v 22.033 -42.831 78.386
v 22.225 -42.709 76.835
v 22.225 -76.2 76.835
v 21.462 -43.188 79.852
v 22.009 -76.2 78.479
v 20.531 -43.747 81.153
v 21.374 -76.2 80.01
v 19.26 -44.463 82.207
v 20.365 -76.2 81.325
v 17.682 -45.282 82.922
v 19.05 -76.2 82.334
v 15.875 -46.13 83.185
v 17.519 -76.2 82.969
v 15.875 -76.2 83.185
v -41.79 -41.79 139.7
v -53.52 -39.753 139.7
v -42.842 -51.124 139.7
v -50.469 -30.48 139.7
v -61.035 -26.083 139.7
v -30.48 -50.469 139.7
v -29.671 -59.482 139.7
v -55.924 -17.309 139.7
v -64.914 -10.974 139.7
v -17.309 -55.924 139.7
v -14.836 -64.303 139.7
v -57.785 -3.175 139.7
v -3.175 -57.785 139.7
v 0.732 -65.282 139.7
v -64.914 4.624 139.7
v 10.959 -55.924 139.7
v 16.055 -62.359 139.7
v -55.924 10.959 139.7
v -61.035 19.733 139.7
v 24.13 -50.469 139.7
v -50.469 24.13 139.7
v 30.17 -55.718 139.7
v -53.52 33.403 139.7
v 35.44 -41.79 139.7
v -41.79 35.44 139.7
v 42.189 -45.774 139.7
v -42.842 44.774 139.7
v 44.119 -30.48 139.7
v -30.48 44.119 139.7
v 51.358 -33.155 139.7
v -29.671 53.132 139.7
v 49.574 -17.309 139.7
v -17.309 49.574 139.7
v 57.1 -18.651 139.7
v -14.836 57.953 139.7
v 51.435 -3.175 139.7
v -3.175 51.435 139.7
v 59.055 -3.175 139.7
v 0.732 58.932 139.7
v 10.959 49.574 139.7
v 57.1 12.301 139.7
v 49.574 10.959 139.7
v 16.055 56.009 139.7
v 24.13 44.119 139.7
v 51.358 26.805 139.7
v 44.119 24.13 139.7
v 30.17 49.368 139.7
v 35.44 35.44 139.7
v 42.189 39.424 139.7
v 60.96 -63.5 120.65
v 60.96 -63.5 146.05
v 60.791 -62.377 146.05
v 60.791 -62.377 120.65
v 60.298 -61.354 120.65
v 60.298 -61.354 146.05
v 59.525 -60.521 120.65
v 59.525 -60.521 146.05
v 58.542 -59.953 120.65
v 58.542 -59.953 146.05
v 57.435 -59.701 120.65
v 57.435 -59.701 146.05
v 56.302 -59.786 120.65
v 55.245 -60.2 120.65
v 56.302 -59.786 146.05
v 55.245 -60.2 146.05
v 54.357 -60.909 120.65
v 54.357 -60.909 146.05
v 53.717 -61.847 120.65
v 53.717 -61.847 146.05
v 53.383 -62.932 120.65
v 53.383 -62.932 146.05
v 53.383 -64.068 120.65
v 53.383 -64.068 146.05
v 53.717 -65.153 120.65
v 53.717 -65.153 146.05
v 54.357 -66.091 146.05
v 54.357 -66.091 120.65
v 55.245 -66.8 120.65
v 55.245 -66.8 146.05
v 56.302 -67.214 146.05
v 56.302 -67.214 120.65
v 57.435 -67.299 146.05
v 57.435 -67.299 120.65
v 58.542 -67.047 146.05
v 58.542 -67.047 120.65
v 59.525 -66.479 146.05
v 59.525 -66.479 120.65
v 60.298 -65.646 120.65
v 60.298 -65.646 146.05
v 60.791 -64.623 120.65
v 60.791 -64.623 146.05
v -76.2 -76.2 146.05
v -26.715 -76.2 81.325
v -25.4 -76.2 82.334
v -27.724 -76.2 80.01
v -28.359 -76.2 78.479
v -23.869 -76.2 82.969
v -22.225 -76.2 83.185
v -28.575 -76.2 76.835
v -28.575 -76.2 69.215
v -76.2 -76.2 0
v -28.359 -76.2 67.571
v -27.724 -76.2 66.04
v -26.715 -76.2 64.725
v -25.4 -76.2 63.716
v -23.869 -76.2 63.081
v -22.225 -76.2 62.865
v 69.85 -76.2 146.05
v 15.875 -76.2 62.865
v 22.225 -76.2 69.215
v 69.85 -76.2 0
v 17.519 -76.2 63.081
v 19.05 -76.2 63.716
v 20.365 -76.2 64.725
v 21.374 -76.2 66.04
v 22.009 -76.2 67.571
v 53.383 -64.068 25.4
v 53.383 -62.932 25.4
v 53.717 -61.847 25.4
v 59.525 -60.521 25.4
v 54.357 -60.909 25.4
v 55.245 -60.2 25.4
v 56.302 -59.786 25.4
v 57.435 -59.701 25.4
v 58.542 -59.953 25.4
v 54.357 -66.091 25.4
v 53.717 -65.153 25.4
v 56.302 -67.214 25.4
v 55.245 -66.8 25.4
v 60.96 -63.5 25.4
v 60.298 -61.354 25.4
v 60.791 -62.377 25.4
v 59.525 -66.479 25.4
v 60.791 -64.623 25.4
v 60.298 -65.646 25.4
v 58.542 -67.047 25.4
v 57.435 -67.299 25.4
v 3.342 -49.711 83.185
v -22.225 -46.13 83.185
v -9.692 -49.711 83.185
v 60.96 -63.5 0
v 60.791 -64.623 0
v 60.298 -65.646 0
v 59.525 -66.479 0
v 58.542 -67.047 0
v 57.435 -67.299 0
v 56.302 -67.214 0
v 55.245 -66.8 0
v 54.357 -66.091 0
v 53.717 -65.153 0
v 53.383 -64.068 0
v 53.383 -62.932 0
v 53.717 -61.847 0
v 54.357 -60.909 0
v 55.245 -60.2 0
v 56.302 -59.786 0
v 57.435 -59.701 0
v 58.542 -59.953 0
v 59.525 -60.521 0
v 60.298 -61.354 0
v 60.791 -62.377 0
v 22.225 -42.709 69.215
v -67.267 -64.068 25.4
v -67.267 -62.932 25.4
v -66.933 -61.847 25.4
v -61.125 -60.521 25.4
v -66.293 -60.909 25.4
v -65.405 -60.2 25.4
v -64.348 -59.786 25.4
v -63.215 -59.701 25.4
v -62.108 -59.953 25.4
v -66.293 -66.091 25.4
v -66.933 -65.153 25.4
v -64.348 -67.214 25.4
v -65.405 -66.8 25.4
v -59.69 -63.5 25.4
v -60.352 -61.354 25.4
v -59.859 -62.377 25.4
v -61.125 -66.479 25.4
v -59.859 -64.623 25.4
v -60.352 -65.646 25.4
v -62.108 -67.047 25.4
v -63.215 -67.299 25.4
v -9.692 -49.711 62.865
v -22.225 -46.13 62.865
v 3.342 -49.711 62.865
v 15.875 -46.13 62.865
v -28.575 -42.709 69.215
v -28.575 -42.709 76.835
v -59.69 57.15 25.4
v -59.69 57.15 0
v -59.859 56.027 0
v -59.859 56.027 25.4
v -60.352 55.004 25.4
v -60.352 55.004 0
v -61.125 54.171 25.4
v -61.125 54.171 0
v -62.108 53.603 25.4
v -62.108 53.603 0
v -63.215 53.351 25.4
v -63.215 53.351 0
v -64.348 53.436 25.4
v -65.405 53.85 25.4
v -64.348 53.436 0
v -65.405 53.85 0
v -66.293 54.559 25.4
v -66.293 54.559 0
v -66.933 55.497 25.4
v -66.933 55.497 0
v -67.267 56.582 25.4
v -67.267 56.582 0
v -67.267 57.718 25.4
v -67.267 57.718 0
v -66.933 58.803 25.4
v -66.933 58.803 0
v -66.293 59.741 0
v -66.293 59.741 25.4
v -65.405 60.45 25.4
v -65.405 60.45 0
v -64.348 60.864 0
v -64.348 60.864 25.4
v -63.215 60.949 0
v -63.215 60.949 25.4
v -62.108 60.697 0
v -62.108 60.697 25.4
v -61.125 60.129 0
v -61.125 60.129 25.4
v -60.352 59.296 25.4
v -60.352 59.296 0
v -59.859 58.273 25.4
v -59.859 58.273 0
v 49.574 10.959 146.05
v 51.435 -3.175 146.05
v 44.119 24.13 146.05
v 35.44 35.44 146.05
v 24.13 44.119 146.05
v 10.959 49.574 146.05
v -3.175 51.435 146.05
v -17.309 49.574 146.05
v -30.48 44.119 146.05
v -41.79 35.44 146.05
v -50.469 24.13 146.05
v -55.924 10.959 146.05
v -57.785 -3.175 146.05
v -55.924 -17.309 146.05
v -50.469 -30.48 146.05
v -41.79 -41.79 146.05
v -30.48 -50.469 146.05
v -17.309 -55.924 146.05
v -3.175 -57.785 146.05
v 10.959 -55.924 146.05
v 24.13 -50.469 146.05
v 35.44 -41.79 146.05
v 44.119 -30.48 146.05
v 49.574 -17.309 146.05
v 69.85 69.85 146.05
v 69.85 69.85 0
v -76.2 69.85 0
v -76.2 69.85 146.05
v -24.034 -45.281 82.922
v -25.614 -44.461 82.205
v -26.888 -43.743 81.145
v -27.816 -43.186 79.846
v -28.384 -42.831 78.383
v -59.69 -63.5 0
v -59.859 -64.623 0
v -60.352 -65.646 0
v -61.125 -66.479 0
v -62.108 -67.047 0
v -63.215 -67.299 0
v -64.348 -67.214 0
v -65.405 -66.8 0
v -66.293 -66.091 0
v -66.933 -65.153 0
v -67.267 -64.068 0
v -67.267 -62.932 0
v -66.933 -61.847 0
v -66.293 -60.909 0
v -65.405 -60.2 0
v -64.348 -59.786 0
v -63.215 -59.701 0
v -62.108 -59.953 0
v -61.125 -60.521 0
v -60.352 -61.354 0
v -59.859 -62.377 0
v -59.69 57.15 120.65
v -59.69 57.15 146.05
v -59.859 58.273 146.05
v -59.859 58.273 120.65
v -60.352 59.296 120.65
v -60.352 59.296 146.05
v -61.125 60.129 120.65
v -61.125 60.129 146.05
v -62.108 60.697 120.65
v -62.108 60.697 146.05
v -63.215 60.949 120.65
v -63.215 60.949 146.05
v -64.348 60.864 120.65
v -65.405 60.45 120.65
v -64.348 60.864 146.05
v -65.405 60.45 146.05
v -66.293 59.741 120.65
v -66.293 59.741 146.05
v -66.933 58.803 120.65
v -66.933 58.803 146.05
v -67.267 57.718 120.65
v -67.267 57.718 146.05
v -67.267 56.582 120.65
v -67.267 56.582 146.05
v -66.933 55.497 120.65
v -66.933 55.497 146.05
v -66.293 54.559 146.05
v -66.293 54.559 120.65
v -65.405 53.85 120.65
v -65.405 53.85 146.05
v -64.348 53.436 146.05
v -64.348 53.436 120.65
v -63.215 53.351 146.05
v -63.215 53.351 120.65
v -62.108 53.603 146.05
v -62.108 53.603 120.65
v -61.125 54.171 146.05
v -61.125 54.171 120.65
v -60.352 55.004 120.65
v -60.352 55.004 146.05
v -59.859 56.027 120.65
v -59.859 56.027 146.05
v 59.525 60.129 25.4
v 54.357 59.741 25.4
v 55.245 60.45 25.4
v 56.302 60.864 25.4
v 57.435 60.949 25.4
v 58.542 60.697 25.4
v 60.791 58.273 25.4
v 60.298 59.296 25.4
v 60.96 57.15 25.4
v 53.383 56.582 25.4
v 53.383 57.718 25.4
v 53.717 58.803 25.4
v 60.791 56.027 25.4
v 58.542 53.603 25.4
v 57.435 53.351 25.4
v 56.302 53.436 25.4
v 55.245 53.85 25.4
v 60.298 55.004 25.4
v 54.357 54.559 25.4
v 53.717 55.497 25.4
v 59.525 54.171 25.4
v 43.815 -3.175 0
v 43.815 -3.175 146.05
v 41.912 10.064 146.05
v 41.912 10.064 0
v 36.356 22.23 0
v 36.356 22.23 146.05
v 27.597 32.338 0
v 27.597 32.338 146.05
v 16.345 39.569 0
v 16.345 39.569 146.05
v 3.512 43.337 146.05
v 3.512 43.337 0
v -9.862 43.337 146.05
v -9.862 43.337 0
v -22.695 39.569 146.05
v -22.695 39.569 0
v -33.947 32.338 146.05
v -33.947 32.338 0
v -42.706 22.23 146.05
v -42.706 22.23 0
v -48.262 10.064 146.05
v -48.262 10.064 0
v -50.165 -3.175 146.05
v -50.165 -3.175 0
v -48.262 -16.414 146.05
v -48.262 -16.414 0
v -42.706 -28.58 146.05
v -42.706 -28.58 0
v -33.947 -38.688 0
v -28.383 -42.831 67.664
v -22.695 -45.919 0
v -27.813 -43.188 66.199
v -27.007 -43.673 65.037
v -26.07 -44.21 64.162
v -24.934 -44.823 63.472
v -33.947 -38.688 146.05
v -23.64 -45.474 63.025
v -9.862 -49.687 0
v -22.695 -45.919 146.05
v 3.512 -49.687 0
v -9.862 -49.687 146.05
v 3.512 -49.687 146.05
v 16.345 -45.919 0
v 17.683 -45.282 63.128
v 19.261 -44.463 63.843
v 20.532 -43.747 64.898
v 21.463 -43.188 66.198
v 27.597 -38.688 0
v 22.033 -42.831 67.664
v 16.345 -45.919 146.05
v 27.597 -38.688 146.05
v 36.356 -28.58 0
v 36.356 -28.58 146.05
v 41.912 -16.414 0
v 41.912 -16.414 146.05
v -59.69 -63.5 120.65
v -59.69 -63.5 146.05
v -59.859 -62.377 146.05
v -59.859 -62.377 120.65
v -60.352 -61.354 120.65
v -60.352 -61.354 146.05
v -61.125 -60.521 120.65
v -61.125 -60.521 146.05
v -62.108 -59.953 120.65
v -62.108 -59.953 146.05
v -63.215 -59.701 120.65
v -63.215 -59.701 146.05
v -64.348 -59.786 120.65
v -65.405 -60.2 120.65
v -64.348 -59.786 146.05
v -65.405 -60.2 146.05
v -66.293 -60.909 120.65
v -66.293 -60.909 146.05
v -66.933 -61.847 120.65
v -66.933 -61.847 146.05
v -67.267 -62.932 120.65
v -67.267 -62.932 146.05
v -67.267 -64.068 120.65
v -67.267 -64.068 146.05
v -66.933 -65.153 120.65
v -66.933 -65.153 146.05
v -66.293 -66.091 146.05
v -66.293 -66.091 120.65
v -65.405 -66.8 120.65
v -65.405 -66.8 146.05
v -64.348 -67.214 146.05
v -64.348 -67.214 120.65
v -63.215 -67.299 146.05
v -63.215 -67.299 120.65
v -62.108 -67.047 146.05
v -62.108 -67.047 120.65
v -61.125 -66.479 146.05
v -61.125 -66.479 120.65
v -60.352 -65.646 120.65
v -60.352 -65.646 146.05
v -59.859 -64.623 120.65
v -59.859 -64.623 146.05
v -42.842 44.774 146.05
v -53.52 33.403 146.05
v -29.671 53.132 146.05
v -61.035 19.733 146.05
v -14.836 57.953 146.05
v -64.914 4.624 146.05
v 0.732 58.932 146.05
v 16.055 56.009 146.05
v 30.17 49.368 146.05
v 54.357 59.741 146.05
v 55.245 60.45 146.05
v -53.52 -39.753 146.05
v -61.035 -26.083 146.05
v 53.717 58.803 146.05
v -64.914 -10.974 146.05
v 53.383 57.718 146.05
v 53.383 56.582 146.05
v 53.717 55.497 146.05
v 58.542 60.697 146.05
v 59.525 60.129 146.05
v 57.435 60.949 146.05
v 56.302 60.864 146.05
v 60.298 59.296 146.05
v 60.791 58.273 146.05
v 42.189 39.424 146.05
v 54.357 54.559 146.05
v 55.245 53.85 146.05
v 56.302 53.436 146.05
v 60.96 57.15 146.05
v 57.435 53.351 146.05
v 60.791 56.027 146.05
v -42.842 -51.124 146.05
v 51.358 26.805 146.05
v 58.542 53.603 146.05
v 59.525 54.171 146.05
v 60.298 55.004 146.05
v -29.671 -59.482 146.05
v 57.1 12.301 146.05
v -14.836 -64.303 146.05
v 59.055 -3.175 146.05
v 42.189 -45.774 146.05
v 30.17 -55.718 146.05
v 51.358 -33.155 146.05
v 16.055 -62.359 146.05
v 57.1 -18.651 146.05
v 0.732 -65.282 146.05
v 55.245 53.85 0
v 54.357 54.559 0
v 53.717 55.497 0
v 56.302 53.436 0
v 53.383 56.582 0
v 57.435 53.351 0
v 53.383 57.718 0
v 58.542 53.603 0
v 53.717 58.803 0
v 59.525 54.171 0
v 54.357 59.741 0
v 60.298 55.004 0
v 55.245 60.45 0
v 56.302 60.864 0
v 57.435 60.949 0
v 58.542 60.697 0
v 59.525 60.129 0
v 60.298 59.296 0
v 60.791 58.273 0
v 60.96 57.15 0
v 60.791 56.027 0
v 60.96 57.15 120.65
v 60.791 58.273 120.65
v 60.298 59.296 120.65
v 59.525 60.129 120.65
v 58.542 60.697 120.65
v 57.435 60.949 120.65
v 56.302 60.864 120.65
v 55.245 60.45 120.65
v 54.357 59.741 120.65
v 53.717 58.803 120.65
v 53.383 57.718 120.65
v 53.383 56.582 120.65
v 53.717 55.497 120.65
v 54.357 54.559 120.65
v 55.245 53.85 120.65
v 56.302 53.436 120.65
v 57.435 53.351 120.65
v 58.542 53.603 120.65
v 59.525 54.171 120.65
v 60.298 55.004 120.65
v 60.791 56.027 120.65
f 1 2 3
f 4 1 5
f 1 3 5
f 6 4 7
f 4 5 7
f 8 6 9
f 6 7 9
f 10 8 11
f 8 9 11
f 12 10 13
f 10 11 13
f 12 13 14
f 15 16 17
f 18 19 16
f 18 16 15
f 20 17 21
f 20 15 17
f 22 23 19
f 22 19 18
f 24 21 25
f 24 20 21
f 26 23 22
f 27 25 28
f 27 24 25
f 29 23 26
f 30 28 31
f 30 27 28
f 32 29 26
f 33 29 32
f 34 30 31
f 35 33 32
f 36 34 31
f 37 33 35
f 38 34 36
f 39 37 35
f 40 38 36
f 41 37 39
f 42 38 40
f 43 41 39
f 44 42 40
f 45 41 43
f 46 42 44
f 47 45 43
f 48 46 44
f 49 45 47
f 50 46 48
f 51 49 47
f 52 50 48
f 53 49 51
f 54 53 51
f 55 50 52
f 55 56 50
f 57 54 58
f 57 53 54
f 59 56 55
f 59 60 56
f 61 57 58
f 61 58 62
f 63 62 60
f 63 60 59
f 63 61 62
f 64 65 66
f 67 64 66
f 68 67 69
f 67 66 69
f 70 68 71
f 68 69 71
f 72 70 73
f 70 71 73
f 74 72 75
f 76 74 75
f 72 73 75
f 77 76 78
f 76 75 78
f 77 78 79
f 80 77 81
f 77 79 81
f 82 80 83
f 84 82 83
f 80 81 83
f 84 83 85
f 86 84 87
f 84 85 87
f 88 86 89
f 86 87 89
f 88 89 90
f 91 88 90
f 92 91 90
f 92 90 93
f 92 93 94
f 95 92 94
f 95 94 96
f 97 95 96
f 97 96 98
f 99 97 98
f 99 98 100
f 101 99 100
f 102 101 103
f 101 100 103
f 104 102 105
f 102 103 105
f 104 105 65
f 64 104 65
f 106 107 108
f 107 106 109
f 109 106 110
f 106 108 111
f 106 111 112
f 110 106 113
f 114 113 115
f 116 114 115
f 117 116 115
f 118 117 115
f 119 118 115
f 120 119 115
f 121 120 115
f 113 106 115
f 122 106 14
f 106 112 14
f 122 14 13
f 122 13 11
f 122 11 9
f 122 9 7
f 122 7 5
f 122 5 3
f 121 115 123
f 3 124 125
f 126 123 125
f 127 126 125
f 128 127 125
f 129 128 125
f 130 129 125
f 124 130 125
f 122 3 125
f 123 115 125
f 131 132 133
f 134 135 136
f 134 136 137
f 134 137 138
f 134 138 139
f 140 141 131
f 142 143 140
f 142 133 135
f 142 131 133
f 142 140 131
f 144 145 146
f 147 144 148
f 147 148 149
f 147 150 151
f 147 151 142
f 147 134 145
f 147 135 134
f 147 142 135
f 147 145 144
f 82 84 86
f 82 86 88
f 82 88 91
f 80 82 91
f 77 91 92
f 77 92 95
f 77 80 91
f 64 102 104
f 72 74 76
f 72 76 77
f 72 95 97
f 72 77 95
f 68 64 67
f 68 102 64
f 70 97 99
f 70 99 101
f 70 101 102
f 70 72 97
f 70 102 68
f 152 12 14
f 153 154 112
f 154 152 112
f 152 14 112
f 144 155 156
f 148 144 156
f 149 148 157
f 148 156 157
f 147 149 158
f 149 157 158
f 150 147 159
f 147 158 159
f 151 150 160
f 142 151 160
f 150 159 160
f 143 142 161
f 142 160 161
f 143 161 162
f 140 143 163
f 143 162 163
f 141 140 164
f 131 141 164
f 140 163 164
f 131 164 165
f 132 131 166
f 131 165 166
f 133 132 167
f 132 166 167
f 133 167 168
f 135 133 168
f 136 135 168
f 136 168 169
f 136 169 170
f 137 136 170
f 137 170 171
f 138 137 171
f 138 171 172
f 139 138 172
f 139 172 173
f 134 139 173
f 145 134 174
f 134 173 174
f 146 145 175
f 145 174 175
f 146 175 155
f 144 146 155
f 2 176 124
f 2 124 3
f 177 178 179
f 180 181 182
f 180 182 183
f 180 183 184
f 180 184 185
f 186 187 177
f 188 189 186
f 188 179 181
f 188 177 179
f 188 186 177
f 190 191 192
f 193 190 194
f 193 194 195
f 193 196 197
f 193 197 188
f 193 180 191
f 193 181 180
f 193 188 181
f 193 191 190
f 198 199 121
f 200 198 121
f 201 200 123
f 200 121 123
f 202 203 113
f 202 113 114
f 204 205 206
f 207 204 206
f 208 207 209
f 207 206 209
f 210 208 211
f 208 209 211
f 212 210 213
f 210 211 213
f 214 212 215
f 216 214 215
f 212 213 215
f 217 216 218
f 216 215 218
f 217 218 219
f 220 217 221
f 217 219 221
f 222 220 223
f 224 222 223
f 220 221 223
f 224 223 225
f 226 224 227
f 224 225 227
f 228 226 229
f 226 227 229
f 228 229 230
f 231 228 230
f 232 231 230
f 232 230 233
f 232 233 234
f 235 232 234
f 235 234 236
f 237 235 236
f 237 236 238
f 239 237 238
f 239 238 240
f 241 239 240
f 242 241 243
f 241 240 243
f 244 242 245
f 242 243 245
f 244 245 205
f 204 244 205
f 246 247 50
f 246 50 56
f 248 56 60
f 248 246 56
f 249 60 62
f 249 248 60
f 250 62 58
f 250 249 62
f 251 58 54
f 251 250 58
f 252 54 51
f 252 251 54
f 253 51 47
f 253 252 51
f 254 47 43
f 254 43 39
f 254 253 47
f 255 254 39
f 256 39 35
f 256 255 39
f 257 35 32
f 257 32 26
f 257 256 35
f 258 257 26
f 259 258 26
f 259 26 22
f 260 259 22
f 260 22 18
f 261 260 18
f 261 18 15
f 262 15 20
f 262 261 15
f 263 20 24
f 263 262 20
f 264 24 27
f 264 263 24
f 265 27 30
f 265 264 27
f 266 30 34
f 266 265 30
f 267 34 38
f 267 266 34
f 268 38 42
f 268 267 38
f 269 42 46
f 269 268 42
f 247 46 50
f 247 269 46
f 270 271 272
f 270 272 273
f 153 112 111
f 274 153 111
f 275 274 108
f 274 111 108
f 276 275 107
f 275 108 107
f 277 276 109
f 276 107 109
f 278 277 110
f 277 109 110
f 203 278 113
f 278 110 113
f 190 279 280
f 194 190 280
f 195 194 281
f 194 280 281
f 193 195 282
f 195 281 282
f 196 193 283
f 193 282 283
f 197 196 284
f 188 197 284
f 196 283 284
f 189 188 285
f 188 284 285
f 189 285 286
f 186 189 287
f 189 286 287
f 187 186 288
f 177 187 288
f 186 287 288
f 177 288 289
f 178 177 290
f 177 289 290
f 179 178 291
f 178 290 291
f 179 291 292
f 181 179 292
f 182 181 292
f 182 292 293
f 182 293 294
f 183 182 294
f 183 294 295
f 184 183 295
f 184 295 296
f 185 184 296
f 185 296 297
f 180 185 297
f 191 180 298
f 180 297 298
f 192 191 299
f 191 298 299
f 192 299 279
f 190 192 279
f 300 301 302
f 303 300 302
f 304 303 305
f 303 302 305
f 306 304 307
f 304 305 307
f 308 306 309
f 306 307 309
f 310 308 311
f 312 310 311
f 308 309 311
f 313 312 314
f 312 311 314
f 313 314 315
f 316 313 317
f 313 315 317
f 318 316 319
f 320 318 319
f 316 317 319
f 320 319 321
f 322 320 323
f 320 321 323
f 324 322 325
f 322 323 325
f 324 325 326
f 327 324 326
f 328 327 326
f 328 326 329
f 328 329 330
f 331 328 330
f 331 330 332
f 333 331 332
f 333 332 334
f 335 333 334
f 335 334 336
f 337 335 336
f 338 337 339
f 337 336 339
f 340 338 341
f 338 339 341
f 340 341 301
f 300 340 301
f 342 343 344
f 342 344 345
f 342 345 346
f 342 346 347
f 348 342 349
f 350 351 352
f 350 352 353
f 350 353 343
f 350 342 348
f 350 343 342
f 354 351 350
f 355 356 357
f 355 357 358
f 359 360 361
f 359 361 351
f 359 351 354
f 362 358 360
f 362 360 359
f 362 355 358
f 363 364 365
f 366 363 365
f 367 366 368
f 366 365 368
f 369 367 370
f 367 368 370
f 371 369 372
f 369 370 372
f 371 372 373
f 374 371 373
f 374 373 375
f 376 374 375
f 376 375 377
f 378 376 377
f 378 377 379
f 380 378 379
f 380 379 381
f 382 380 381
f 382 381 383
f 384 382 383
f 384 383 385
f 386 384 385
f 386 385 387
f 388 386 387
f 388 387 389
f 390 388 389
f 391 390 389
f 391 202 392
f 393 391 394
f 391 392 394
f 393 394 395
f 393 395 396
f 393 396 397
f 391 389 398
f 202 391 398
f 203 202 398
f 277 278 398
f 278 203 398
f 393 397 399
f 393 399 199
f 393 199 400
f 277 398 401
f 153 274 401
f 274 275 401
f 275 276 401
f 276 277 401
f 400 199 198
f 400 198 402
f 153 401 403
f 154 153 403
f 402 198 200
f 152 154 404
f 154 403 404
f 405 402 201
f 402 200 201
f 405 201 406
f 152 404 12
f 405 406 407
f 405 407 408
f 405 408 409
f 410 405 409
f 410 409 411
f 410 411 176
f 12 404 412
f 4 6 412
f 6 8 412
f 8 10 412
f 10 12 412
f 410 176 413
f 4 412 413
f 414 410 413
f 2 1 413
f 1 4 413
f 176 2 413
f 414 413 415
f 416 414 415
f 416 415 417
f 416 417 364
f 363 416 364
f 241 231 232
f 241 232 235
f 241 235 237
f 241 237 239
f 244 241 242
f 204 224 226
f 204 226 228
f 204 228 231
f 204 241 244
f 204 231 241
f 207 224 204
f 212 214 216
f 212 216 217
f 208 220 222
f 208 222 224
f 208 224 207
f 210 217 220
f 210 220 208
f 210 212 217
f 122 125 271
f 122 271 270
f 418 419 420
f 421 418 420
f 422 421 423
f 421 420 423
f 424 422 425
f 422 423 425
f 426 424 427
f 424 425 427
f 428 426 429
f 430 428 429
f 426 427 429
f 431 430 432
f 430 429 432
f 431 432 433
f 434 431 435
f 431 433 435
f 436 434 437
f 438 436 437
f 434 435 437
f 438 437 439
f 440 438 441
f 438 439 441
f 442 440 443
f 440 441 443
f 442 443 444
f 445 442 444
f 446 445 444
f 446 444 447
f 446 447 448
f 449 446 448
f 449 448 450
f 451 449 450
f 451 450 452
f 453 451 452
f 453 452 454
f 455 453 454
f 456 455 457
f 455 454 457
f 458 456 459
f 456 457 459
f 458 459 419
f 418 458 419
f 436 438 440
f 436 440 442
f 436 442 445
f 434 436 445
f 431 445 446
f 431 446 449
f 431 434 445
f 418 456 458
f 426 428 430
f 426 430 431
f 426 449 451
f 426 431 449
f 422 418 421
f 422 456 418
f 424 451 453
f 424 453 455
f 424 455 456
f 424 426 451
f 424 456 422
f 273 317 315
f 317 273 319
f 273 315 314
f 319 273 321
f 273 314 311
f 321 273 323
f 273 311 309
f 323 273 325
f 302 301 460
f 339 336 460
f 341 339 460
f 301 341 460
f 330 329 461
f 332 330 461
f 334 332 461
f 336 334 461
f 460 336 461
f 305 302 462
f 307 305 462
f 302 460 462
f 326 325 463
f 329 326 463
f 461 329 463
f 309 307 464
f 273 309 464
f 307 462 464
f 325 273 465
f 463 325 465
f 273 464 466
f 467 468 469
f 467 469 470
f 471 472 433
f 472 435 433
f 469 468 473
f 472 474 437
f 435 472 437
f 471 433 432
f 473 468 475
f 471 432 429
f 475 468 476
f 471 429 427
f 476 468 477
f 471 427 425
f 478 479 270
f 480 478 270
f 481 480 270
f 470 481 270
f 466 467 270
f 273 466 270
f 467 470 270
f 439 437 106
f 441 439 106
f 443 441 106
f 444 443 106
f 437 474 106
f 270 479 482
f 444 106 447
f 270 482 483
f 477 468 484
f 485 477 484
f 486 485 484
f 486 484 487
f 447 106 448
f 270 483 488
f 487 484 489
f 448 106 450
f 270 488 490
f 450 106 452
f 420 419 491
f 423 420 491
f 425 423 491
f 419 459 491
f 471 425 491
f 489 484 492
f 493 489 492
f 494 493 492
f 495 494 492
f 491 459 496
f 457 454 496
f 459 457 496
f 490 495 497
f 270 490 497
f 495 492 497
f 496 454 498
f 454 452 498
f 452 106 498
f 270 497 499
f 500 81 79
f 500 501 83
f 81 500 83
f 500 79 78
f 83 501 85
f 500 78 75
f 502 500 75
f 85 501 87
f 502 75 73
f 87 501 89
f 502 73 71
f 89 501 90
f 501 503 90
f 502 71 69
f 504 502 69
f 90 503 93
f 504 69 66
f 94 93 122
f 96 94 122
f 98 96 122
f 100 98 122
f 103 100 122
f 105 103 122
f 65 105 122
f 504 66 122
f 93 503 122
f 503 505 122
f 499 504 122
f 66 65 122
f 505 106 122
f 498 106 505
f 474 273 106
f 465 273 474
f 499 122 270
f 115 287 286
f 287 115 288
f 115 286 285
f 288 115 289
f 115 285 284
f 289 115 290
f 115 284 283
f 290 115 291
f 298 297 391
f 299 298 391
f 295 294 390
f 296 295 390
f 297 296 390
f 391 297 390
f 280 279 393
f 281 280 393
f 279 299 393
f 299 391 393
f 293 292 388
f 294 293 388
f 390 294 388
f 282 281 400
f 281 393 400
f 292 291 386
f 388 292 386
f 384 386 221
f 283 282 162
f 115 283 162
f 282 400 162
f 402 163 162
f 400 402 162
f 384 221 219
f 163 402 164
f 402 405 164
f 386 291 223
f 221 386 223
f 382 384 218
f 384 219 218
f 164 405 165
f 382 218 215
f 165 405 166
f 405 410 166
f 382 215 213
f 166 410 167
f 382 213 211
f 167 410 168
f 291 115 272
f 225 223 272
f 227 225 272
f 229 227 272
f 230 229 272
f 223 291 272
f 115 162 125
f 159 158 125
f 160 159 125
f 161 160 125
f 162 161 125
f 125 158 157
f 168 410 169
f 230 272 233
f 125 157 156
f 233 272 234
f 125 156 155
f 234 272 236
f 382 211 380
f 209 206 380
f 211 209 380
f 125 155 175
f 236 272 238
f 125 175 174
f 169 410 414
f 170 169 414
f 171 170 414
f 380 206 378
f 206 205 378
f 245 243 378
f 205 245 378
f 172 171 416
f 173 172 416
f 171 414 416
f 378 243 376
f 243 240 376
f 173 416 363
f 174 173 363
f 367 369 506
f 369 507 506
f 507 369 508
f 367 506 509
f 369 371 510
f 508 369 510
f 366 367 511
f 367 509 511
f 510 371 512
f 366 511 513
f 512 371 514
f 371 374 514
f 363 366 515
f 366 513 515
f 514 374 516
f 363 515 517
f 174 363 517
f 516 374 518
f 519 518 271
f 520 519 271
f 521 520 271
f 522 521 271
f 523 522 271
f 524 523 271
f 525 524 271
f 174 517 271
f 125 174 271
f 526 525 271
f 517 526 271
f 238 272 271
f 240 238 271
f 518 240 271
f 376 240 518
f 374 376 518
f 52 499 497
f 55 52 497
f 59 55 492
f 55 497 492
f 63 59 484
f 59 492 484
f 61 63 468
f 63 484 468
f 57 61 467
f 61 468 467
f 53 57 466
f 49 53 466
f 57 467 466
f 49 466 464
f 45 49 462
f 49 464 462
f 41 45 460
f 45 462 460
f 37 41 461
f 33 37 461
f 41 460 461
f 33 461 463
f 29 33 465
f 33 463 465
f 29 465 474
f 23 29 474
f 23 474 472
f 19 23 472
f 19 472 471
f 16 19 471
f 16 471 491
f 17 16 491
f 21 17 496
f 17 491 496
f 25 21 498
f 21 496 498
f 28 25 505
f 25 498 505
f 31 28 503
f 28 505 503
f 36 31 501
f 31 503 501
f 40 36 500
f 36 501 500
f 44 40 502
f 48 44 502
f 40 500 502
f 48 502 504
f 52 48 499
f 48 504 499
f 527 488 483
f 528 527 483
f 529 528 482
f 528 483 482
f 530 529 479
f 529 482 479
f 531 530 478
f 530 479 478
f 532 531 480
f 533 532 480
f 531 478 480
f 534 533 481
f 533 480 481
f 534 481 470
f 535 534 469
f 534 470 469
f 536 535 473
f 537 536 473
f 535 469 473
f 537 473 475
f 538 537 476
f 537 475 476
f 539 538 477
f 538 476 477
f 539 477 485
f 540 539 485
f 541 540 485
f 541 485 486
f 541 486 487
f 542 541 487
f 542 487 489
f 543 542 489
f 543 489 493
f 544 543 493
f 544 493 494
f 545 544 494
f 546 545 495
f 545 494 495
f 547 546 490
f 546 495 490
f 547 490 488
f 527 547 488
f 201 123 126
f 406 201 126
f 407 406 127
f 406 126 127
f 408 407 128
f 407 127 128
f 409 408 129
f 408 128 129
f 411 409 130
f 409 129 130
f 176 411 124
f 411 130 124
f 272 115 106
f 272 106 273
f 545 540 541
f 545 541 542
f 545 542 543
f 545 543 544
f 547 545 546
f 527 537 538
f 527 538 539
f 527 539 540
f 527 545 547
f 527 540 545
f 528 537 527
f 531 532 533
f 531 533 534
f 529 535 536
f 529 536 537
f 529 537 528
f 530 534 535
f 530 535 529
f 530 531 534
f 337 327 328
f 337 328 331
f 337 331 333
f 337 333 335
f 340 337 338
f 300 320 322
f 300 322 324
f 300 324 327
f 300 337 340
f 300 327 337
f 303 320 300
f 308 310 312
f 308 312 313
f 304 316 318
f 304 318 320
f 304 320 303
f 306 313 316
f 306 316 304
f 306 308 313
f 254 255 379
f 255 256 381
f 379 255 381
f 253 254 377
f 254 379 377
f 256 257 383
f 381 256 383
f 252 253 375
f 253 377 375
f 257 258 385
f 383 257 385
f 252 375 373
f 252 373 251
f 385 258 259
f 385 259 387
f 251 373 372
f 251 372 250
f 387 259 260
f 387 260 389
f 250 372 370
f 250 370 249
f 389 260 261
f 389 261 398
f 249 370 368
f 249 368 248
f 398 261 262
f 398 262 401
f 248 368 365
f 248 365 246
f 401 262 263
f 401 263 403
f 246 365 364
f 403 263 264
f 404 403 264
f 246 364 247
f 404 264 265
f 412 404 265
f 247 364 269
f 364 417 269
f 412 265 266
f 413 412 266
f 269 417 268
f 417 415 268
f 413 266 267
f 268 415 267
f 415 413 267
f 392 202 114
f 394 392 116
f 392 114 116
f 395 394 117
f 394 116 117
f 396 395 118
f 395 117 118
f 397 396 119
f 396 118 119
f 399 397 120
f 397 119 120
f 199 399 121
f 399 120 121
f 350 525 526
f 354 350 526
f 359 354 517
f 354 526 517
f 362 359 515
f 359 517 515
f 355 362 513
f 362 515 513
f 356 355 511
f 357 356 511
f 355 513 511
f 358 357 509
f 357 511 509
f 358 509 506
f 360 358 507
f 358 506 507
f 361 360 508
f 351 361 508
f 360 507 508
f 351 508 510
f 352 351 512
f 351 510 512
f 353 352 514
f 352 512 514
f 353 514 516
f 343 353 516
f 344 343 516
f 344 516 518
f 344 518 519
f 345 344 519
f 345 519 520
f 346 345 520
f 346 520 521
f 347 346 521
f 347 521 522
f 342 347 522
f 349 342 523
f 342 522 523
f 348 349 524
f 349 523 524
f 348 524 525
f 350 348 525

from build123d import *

# Parameters (mm, degrees)
F0_W      = 152.4
F0_H      = 152.4
F1_DEPTH  = 152.4
F2_W      = 6.35
F2_H      = 152.4
F3_DEPTH  = 152.401
F4_W      = 6.35
F4_H      = 152.4
F5_DEPTH  = 146.051
F6_W      = 146.05
F6_H      = 6.35
F7_DEPTH  = 146.051
F8_R      = 3.81
F9_DEPTH  = 25.4
F8_R_2    = 62.23
F8_R_3    = 54.61
F10_DEPTH = 6.35
F8_R_4    = 46.99
F11_DEPTH = 146.051
F13_DEPTH = 50.8
F14_R     = 3.81
F15_DEPTH = 25.4


with BuildPart() as f1:
    # F0 (on Top) → F1 (new body)
    with BuildSketch(Plane.XY):
        Rectangle(F0_W, F0_H)
    extrude(amount=F1_DEPTH)

    # F2 (on face) → F3 (cut, through all)
    with BuildSketch(Plane.XZ.offset(76.2)):
        with Locations((73.025, 76.2)):
            Rectangle(F2_W, F2_H)
    extrude(amount=-F3_DEPTH, mode=Mode.SUBTRACT)

    # F4 (on face) → F5 (cut, through all)
    with BuildSketch(Plane.YZ.offset(69.85)):
        with Locations((73.025, 76.2)):
            Rectangle(F4_W, F4_H)
    extrude(amount=-F5_DEPTH, mode=Mode.SUBTRACT)

    # F6 (on face) → F7 (cut, through all)
    with BuildSketch(Plane.XZ.offset(76.2)):
        with Locations((-3.175, 149.225)):
            Rectangle(F6_W, F6_H)
    extrude(amount=-F7_DEPTH, mode=Mode.SUBTRACT)

    # F8 (on face) → F9 (cut)
    with BuildSketch(Plane.XY.offset(146.05)):
        with Locations((-63.5, 57.15)):
            Circle(F8_R)
        with Locations((57.15, 57.15)):
            Circle(F8_R)
        with Locations((57.15, -63.5)):
            Circle(F8_R)
        with Locations((-63.5, -63.5)):
            Circle(F8_R)
    extrude(amount=-F9_DEPTH, mode=Mode.SUBTRACT)

    # F8 (on face) → F10 (cut)
    with BuildSketch(Plane.XY.offset(146.05)):
        with Locations((-3.175, -3.175)):
            Circle(F8_R_2)
        with Locations((-3.175, -3.175)):
            Circle(F8_R_3, mode=Mode.SUBTRACT)
    extrude(amount=-F10_DEPTH, mode=Mode.SUBTRACT)

    # F8 (on face) → F11 (cut, through all)
    with BuildSketch(Plane.XY.offset(146.05)):
        with Locations((-3.175, -3.175)):
            Circle(F8_R_4)
    extrude(amount=-F11_DEPTH, mode=Mode.SUBTRACT)

    # F12 (on face) → F13 (cut)
    with BuildSketch(Plane.XZ.offset(76.2)):
        with BuildLine():
            ThreePointArc((22.225, 76.835), (20.3651280605, 81.3251280605), (15.875, 83.185))
            Line((15.875, 83.185), (-22.225, 83.185))
            ThreePointArc((-22.225, 83.185), (-26.7151280605, 81.3251280605), (-28.575, 76.835))
            Line((-28.575, 76.835), (-28.575, 69.215))
            ThreePointArc((-28.575, 69.215), (-26.7151280605, 64.7248719395), (-22.225, 62.865))
            Line((-22.225, 62.865), (15.875, 62.865))
            ThreePointArc((15.875, 62.865), (20.3651280605, 64.7248719395), (22.225, 69.215))
            Line((22.225, 69.215), (22.225, 76.835))
        make_face()
    extrude(amount=-F13_DEPTH, mode=Mode.SUBTRACT)

    # F14 (on face) → F15 (cut)
    with BuildSketch(Plane(origin=(0, 0, 0), x_dir=(1, 0, 0), z_dir=(0, 0, -1))):
        with Locations((-63.5, 63.5)):
            Circle(F14_R)
        with Locations((57.15, 63.5)):
            Circle(F14_R)
        with Locations((57.15, -57.15)):
            Circle(F14_R)
        with Locations((-63.5, -57.15)):
            Circle(F14_R)
    extrude(amount=-F15_DEPTH, mode=Mode.SUBTRACT)


solid = f1.part
